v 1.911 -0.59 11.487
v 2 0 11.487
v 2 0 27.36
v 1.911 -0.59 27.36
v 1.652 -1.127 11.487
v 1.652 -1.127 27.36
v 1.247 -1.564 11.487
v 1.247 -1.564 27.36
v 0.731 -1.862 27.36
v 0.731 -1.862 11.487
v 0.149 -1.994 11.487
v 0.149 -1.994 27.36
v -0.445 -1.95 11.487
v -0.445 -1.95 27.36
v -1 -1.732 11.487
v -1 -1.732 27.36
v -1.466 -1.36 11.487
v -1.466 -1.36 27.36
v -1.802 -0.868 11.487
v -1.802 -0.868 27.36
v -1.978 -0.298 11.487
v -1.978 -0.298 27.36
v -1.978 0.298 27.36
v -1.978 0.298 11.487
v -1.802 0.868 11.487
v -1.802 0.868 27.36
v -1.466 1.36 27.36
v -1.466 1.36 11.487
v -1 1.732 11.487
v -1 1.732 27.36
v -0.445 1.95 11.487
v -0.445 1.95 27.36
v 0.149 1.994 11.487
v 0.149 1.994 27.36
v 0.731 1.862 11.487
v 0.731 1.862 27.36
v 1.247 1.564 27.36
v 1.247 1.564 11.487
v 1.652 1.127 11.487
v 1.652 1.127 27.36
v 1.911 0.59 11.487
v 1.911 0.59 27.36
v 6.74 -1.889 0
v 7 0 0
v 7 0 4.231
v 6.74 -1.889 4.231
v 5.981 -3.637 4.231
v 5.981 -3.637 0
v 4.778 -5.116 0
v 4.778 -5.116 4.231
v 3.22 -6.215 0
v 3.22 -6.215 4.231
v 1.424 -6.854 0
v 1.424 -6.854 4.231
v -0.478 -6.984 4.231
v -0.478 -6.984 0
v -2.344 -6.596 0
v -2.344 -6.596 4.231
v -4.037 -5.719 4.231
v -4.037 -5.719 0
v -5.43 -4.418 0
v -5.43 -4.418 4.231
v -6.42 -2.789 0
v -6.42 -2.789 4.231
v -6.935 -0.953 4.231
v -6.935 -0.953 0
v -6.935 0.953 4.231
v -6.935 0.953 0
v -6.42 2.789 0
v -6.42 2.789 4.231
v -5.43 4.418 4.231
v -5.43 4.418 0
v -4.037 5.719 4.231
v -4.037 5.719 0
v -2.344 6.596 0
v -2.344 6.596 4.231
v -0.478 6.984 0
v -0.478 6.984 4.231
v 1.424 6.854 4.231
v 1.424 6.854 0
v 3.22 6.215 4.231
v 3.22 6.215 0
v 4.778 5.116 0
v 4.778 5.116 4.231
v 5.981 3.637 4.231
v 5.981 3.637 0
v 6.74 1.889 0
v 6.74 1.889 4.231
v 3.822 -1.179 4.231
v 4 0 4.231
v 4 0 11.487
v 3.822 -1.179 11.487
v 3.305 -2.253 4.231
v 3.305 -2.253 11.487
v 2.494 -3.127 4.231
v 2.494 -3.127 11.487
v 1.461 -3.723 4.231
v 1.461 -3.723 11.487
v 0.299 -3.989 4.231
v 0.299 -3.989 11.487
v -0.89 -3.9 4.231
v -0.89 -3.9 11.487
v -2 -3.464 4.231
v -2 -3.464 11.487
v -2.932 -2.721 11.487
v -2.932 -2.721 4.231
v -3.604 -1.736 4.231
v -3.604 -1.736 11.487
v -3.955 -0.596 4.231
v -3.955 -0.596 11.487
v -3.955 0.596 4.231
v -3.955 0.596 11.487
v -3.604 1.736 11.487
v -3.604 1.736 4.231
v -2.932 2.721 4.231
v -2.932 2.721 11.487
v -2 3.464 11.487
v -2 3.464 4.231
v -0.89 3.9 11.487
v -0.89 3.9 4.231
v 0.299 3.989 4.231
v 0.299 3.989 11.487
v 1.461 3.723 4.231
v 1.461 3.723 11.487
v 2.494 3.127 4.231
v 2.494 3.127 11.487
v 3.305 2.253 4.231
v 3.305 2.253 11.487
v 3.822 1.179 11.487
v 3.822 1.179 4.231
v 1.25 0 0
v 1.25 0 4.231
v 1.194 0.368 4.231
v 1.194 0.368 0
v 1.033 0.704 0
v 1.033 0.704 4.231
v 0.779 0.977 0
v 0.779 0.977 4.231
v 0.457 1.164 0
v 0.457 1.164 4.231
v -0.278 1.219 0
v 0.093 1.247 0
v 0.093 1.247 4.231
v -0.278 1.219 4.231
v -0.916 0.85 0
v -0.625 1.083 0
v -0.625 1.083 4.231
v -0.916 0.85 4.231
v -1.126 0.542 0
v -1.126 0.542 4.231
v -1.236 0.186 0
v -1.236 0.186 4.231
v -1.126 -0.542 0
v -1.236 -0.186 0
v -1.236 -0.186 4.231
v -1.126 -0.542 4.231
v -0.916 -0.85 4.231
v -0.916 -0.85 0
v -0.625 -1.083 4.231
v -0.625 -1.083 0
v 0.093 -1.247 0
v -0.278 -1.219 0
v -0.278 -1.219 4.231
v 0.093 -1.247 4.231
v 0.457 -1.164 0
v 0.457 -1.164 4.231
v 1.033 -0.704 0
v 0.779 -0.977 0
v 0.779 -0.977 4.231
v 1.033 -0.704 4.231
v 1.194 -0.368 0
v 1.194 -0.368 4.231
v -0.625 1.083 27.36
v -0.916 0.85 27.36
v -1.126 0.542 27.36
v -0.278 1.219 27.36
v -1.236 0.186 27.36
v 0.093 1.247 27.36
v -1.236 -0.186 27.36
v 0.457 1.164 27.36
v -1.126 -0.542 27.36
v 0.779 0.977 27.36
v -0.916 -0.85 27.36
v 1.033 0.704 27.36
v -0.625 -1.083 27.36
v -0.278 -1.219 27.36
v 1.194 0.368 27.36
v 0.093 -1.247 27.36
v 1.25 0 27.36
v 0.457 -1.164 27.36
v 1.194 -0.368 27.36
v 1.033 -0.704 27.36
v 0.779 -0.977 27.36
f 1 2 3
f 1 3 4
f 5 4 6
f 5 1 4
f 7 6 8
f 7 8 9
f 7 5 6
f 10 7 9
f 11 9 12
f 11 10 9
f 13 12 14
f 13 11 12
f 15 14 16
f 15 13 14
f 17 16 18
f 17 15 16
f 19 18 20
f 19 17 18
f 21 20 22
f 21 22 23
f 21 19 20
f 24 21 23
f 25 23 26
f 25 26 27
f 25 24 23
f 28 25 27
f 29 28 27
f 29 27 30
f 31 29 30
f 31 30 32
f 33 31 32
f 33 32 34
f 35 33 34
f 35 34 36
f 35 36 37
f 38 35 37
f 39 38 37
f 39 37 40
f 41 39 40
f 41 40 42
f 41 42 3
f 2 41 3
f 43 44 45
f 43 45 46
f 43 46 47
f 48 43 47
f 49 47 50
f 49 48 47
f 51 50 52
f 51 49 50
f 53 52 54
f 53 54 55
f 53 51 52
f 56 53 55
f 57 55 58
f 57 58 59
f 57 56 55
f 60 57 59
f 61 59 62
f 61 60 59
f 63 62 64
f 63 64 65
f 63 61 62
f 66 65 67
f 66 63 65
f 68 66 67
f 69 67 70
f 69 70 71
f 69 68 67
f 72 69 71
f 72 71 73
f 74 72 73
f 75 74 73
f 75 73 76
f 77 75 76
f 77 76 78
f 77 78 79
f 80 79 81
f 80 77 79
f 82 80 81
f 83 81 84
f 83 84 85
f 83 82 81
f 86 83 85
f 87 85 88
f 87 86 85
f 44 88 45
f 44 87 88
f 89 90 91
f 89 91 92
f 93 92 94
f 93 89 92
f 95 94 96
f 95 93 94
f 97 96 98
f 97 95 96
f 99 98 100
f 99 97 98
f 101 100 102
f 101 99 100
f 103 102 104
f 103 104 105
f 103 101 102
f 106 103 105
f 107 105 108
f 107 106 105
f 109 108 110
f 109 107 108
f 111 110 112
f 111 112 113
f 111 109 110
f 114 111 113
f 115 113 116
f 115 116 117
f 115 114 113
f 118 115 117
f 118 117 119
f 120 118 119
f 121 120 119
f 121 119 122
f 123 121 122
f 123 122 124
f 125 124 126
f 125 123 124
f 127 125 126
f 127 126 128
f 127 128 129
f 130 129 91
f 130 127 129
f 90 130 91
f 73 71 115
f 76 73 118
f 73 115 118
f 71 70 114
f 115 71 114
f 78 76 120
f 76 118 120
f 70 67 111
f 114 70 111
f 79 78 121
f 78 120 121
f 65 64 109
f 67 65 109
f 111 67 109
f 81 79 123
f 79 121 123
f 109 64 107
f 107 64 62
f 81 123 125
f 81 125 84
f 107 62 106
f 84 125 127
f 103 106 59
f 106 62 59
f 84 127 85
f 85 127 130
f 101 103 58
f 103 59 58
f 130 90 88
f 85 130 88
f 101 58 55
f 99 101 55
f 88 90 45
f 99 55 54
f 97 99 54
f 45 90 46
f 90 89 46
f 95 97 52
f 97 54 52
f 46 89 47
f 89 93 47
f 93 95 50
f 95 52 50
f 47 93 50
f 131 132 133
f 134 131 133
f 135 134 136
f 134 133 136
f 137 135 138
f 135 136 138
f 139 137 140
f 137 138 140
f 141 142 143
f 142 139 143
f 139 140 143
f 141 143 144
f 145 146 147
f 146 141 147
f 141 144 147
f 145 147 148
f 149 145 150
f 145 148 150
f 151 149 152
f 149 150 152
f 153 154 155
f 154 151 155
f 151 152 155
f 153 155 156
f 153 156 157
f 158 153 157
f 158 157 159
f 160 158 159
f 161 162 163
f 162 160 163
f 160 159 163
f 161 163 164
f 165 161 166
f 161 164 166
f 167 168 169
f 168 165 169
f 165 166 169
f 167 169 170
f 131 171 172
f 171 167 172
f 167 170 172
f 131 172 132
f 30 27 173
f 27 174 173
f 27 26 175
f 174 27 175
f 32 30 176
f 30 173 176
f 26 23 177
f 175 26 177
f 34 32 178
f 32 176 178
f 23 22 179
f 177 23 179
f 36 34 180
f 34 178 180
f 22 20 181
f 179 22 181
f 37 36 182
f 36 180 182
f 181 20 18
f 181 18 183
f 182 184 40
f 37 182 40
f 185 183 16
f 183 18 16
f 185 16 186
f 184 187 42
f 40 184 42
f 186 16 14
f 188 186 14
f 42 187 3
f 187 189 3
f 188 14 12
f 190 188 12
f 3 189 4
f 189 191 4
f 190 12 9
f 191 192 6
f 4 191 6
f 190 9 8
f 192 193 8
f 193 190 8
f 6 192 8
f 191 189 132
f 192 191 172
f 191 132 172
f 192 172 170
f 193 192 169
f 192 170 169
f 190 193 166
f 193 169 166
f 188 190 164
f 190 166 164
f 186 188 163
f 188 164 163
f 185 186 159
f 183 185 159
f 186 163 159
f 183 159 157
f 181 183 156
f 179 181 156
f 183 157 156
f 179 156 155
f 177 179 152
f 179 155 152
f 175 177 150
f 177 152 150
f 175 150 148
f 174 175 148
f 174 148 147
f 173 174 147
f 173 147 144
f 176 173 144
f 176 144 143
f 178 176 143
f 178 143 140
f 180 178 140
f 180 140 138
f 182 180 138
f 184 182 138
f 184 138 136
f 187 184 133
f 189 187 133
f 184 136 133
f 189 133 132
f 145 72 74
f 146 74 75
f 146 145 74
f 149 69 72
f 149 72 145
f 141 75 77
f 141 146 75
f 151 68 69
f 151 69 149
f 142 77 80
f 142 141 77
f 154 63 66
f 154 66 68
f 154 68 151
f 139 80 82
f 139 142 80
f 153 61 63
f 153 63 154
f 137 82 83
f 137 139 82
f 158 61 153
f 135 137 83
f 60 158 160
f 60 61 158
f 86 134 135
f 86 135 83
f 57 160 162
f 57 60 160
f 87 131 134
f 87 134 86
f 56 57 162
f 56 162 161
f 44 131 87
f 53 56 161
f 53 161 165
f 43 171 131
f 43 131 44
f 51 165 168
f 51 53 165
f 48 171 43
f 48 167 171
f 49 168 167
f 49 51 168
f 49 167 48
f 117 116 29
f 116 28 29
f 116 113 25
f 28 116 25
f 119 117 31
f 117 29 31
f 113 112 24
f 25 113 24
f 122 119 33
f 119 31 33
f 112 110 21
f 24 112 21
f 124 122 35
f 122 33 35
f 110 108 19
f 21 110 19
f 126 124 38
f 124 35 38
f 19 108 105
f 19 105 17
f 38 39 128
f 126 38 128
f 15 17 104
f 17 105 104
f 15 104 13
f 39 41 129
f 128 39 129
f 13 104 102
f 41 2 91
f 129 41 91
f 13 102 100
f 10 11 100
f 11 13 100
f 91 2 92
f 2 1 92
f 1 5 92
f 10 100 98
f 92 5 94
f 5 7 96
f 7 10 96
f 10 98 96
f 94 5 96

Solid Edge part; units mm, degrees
sketch "Sketch1" plane through (0, 0, 0) normal (0, -1, 0) x (1, 0, 0)
  line L0 (2, 27.36) -> (2, 11.4867)
  line L1 (2, 11.4867) -> (4, 11.4867)
  line L2 (4, 11.4867) -> (4, 4.2309)
  line L3 (4, 4.2309) -> (7, 4.2309)
  line L4 (7, 4.2309) -> (7, 0)
  line L5 (7, 0) -> (1.25, 0)
  line L6 (1.25, 0) -> (1.25, 4.2309)
  line L7 (1.25, 27.36) -> (1.25, 4.2309)
  line L8 (1.25, 27.36) -> (2, 27.36)
  dimension "D1" = 2
  dimension "D2" = 1.25
  dimension "D3" = 4
  dimension "D4" = 7
revolve "RevolvedProtrusion1" add sketch "Sketch1" angle 360 about axis through (0, 0, 54) along (0, 0, -1)
cosmetic_thread "Thread1" size "M8"
